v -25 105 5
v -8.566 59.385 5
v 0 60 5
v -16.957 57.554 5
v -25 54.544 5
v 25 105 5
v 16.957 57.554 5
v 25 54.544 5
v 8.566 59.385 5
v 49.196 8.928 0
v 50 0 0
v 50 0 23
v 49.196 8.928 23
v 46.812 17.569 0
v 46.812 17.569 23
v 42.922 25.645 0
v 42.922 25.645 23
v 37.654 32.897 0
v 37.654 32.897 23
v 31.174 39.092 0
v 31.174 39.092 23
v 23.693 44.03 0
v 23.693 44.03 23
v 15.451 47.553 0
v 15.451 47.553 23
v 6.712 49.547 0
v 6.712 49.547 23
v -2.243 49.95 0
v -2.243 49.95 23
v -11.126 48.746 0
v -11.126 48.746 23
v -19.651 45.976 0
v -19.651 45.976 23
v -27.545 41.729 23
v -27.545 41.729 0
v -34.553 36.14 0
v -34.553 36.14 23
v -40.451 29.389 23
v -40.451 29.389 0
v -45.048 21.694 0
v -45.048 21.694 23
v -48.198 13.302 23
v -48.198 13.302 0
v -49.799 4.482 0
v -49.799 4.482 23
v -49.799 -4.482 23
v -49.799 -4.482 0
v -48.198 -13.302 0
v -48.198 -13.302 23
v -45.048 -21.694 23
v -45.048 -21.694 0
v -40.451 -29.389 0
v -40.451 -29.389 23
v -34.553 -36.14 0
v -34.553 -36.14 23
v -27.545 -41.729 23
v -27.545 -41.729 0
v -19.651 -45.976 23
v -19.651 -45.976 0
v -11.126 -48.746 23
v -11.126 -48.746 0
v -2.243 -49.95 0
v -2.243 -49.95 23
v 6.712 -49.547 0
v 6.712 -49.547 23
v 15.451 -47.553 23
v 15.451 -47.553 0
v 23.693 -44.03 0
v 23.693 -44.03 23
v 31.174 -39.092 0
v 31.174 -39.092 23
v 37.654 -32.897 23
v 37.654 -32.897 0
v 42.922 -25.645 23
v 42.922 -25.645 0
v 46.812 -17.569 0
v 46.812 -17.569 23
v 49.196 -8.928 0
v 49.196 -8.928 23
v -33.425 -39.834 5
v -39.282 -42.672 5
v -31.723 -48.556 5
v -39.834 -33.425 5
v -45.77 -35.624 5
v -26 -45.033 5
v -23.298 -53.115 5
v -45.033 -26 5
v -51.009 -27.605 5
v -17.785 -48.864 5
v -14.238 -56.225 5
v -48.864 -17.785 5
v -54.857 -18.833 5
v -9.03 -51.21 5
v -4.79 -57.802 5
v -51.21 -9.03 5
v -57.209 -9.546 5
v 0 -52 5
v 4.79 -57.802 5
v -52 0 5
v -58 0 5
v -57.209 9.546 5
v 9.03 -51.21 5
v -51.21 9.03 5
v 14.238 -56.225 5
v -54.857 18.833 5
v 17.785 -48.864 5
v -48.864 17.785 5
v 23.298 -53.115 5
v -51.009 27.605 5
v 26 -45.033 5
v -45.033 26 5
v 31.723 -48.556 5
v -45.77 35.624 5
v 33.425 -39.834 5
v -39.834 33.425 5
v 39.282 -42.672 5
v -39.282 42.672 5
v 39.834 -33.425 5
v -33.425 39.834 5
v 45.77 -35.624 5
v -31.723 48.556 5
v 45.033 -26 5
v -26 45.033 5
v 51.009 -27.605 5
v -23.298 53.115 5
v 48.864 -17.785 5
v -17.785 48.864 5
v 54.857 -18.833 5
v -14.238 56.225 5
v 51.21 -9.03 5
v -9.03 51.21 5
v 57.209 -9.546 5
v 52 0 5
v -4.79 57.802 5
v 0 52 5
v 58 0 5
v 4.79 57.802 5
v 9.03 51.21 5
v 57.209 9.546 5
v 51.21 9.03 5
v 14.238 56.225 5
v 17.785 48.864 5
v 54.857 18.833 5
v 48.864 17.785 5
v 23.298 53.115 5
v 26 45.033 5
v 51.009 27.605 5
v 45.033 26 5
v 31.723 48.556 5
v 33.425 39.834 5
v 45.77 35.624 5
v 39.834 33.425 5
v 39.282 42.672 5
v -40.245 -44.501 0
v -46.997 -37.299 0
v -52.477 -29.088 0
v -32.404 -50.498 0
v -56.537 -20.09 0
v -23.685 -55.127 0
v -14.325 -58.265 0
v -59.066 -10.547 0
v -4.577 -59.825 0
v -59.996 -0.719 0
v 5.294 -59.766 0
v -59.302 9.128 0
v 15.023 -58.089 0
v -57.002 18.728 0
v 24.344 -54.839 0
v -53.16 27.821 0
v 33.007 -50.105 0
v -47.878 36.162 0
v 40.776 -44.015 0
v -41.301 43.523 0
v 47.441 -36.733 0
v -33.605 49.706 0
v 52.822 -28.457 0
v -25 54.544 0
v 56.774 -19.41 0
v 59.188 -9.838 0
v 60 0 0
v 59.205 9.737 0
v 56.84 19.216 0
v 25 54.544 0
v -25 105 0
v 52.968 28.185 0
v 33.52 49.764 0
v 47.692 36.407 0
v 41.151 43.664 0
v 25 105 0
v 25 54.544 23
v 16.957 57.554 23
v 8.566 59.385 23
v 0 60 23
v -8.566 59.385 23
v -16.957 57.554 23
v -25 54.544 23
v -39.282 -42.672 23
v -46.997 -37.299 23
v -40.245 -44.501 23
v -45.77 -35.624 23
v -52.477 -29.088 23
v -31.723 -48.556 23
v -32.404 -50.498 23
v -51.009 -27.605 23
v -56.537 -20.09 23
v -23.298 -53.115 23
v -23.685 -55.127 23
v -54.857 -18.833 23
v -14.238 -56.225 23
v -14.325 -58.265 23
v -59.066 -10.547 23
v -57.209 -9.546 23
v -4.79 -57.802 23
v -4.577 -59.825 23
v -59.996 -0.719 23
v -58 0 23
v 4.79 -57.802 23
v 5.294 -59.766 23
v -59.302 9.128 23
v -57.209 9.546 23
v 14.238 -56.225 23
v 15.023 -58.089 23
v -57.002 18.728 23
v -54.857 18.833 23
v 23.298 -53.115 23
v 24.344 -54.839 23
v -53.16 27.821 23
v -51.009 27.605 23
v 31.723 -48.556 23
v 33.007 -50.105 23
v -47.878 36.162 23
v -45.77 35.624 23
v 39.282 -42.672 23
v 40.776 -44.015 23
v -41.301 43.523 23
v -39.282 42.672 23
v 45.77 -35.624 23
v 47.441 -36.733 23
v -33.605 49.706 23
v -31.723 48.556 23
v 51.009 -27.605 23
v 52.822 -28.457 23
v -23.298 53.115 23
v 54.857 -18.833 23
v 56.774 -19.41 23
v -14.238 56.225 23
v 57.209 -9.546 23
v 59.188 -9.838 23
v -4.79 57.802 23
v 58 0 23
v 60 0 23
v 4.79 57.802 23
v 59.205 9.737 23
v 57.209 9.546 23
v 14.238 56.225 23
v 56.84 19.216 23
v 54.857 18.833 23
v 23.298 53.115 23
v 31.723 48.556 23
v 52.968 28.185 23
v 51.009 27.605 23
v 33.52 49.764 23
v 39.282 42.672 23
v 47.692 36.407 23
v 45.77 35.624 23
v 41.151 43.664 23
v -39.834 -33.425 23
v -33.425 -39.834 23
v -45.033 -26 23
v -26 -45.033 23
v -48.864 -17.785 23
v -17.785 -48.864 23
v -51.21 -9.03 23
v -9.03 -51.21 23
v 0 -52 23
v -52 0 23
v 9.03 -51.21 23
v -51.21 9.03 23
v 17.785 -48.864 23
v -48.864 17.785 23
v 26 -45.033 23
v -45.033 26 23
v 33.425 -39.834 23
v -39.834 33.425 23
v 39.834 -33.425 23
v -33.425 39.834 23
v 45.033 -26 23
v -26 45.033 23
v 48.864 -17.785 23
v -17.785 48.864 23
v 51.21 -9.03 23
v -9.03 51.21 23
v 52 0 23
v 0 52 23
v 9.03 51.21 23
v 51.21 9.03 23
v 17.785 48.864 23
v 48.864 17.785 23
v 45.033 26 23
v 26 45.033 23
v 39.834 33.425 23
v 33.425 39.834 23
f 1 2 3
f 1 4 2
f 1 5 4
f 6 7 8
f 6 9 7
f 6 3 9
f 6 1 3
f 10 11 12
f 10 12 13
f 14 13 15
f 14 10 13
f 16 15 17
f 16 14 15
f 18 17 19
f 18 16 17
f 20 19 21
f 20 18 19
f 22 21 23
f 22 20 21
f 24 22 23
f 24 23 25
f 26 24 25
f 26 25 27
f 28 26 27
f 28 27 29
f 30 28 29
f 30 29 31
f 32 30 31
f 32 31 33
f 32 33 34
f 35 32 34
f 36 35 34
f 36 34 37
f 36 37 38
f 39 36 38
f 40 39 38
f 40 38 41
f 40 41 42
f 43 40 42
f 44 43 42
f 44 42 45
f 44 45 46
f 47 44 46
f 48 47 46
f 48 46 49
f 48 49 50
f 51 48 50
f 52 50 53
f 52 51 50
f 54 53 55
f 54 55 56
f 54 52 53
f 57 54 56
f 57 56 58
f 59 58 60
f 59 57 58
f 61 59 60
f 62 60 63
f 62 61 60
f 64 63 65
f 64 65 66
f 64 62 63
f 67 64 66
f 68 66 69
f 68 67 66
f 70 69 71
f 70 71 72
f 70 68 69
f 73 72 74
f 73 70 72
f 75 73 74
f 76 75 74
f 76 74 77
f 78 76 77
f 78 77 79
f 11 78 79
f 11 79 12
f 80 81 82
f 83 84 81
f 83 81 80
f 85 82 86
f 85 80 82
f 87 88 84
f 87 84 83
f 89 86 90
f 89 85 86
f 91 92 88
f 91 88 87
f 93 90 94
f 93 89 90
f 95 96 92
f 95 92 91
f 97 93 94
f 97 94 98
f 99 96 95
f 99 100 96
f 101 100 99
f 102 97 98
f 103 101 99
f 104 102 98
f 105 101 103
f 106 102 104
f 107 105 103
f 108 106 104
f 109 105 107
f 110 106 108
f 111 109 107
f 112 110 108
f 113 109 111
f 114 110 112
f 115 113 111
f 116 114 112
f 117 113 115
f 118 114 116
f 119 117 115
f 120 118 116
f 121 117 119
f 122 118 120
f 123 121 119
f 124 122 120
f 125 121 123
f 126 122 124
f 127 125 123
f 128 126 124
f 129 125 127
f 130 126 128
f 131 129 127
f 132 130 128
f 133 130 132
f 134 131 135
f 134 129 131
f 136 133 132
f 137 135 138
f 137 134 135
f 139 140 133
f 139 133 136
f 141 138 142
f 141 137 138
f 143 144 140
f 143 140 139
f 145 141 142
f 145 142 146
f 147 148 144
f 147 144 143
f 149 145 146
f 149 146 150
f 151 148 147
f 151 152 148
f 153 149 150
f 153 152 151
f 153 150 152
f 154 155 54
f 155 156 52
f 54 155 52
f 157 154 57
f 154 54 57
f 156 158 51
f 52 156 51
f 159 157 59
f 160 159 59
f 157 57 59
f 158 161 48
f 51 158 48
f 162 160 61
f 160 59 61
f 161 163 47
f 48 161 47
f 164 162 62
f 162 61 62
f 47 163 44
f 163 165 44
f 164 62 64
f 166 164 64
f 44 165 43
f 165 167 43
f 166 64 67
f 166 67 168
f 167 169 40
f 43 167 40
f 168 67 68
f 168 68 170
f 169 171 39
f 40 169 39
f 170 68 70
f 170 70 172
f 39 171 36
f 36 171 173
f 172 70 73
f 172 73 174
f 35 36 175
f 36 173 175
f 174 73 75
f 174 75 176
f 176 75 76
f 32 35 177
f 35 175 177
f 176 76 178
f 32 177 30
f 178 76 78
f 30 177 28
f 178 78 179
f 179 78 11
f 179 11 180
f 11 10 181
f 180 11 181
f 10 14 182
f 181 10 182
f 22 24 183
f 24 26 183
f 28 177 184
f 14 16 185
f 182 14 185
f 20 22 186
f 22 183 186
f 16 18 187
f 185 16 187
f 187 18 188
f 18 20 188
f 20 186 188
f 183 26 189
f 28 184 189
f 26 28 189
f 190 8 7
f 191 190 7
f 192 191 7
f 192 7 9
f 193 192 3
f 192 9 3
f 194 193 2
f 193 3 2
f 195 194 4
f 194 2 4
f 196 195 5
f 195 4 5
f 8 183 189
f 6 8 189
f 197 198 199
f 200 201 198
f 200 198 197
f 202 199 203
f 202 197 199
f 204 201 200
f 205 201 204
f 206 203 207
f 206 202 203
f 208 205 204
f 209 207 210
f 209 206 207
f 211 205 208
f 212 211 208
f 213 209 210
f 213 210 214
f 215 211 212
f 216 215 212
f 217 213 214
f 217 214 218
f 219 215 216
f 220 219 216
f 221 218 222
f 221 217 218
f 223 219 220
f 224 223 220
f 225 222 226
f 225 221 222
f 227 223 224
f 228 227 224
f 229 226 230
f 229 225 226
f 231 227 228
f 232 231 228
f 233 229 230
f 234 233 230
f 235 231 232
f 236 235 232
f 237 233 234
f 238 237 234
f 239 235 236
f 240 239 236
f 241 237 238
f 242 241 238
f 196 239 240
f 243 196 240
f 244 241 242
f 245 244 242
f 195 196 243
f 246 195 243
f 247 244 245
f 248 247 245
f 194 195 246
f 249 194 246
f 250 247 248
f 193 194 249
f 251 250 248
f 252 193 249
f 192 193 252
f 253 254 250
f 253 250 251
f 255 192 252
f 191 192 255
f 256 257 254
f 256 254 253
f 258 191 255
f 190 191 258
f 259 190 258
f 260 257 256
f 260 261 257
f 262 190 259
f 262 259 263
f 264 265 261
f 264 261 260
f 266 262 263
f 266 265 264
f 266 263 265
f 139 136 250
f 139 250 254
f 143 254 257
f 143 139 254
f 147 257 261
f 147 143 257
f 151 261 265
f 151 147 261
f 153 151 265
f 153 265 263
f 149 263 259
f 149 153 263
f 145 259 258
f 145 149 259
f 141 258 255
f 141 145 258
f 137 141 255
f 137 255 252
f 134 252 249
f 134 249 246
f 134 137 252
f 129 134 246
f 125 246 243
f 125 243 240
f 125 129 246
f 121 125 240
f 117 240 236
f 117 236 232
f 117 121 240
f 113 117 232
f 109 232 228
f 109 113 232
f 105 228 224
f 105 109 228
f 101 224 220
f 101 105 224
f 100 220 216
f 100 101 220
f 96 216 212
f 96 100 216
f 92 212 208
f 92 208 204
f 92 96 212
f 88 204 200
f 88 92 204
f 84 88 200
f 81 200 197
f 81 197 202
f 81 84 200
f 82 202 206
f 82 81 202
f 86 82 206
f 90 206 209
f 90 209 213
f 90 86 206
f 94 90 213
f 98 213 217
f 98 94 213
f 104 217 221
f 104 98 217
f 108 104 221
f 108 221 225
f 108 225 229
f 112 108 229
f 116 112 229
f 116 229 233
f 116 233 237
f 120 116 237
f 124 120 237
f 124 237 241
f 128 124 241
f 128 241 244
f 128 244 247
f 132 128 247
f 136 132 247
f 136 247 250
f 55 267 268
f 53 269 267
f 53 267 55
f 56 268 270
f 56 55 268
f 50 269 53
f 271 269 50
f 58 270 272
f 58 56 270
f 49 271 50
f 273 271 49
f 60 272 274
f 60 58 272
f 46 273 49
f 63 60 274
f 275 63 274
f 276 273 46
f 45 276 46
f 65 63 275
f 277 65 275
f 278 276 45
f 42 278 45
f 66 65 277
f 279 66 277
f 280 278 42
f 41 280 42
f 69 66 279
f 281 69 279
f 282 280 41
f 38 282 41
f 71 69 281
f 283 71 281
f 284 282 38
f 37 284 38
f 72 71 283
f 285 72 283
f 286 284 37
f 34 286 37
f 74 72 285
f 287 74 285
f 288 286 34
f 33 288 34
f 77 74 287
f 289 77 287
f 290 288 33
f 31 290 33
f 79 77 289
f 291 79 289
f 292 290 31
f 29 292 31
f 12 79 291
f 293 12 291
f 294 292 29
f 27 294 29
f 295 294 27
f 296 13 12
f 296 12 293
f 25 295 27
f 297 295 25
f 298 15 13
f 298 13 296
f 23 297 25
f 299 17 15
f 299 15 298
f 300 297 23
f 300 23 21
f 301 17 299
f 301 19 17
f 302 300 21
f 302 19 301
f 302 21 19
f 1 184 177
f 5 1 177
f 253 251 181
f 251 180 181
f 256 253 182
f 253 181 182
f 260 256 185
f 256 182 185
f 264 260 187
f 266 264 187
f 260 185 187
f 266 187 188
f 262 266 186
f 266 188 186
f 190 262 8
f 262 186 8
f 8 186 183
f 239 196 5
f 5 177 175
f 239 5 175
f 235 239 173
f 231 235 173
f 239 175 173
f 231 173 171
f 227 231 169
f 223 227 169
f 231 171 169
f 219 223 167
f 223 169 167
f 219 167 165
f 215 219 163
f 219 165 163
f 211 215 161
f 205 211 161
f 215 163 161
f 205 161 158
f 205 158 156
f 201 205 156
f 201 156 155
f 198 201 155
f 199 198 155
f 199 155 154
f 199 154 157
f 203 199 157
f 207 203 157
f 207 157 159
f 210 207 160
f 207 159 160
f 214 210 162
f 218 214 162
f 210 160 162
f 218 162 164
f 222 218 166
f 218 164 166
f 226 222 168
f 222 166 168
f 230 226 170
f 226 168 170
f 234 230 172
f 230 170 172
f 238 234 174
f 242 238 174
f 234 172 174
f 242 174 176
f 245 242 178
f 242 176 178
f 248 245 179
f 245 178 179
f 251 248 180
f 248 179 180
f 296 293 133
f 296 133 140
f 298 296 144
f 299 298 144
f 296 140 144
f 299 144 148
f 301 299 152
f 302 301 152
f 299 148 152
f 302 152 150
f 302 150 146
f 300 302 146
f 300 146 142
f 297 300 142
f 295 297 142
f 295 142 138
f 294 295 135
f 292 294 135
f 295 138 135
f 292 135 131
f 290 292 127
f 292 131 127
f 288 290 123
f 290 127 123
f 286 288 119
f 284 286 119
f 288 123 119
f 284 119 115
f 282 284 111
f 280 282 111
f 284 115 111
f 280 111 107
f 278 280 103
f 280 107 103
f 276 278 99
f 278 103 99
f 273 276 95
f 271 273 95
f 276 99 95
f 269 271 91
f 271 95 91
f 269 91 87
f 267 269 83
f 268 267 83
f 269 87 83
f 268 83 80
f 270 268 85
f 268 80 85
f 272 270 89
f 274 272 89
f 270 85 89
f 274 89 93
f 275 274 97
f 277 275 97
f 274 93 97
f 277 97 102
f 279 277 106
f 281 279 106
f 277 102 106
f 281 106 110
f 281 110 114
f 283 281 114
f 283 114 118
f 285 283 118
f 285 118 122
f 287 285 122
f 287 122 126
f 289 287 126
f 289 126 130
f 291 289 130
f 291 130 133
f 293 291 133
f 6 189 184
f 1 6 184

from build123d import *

# Parameters (mm, degrees)
F0_R     = 50
F1_DEPTH = 5
F2_R     = 58
F2_R_2   = 52
F2_R_3   = 50
F3_DEPTH = 18


with BuildPart() as f1:
    # F0 (on Top) → F1 (new body)
    with BuildSketch(Plane.XY):
        with BuildLine():
            ThreePointArc((-25, 54.543561), (-32.403703, -50.497525), (60, 0))
            ThreePointArc((60, 0), (50.497525, 32.403703), (25, 54.543561))
            ThreePointArc((25, 54.543561), (0, 60), (-25, 54.543561))
        make_face()
        Circle(F0_R, mode=Mode.SUBTRACT)
        with BuildLine():
            ThreePointArc((-25, 54.543561), (0, 60), (25, 54.543561))
            Line((25, 54.543561), (25, 60))
            Line((25, 60), (25, 105))
            Line((25, 105), (-25, 105))
            Line((-25, 105), (-25, 54.543561))
        make_face()
    extrude(amount=F1_DEPTH)

    # F2 (on face) → F3 (join)
    with BuildSketch(Plane.XY.offset(5)):
        with BuildLine():
            ThreePointArc((-25, 54.543561), (-32.403703, -50.497525), (60, 0))
            ThreePointArc((60, 0), (50.497525, 32.403703), (25, 54.543561))
            ThreePointArc((25, 54.543561), (0, 60), (-25, 54.543561))
        make_face()
        Circle(F2_R, mode=Mode.SUBTRACT)
        Circle(F2_R_2)
        Circle(F2_R_3, mode=Mode.SUBTRACT)
    extrude(amount=F3_DEPTH)


solid = f1.part
